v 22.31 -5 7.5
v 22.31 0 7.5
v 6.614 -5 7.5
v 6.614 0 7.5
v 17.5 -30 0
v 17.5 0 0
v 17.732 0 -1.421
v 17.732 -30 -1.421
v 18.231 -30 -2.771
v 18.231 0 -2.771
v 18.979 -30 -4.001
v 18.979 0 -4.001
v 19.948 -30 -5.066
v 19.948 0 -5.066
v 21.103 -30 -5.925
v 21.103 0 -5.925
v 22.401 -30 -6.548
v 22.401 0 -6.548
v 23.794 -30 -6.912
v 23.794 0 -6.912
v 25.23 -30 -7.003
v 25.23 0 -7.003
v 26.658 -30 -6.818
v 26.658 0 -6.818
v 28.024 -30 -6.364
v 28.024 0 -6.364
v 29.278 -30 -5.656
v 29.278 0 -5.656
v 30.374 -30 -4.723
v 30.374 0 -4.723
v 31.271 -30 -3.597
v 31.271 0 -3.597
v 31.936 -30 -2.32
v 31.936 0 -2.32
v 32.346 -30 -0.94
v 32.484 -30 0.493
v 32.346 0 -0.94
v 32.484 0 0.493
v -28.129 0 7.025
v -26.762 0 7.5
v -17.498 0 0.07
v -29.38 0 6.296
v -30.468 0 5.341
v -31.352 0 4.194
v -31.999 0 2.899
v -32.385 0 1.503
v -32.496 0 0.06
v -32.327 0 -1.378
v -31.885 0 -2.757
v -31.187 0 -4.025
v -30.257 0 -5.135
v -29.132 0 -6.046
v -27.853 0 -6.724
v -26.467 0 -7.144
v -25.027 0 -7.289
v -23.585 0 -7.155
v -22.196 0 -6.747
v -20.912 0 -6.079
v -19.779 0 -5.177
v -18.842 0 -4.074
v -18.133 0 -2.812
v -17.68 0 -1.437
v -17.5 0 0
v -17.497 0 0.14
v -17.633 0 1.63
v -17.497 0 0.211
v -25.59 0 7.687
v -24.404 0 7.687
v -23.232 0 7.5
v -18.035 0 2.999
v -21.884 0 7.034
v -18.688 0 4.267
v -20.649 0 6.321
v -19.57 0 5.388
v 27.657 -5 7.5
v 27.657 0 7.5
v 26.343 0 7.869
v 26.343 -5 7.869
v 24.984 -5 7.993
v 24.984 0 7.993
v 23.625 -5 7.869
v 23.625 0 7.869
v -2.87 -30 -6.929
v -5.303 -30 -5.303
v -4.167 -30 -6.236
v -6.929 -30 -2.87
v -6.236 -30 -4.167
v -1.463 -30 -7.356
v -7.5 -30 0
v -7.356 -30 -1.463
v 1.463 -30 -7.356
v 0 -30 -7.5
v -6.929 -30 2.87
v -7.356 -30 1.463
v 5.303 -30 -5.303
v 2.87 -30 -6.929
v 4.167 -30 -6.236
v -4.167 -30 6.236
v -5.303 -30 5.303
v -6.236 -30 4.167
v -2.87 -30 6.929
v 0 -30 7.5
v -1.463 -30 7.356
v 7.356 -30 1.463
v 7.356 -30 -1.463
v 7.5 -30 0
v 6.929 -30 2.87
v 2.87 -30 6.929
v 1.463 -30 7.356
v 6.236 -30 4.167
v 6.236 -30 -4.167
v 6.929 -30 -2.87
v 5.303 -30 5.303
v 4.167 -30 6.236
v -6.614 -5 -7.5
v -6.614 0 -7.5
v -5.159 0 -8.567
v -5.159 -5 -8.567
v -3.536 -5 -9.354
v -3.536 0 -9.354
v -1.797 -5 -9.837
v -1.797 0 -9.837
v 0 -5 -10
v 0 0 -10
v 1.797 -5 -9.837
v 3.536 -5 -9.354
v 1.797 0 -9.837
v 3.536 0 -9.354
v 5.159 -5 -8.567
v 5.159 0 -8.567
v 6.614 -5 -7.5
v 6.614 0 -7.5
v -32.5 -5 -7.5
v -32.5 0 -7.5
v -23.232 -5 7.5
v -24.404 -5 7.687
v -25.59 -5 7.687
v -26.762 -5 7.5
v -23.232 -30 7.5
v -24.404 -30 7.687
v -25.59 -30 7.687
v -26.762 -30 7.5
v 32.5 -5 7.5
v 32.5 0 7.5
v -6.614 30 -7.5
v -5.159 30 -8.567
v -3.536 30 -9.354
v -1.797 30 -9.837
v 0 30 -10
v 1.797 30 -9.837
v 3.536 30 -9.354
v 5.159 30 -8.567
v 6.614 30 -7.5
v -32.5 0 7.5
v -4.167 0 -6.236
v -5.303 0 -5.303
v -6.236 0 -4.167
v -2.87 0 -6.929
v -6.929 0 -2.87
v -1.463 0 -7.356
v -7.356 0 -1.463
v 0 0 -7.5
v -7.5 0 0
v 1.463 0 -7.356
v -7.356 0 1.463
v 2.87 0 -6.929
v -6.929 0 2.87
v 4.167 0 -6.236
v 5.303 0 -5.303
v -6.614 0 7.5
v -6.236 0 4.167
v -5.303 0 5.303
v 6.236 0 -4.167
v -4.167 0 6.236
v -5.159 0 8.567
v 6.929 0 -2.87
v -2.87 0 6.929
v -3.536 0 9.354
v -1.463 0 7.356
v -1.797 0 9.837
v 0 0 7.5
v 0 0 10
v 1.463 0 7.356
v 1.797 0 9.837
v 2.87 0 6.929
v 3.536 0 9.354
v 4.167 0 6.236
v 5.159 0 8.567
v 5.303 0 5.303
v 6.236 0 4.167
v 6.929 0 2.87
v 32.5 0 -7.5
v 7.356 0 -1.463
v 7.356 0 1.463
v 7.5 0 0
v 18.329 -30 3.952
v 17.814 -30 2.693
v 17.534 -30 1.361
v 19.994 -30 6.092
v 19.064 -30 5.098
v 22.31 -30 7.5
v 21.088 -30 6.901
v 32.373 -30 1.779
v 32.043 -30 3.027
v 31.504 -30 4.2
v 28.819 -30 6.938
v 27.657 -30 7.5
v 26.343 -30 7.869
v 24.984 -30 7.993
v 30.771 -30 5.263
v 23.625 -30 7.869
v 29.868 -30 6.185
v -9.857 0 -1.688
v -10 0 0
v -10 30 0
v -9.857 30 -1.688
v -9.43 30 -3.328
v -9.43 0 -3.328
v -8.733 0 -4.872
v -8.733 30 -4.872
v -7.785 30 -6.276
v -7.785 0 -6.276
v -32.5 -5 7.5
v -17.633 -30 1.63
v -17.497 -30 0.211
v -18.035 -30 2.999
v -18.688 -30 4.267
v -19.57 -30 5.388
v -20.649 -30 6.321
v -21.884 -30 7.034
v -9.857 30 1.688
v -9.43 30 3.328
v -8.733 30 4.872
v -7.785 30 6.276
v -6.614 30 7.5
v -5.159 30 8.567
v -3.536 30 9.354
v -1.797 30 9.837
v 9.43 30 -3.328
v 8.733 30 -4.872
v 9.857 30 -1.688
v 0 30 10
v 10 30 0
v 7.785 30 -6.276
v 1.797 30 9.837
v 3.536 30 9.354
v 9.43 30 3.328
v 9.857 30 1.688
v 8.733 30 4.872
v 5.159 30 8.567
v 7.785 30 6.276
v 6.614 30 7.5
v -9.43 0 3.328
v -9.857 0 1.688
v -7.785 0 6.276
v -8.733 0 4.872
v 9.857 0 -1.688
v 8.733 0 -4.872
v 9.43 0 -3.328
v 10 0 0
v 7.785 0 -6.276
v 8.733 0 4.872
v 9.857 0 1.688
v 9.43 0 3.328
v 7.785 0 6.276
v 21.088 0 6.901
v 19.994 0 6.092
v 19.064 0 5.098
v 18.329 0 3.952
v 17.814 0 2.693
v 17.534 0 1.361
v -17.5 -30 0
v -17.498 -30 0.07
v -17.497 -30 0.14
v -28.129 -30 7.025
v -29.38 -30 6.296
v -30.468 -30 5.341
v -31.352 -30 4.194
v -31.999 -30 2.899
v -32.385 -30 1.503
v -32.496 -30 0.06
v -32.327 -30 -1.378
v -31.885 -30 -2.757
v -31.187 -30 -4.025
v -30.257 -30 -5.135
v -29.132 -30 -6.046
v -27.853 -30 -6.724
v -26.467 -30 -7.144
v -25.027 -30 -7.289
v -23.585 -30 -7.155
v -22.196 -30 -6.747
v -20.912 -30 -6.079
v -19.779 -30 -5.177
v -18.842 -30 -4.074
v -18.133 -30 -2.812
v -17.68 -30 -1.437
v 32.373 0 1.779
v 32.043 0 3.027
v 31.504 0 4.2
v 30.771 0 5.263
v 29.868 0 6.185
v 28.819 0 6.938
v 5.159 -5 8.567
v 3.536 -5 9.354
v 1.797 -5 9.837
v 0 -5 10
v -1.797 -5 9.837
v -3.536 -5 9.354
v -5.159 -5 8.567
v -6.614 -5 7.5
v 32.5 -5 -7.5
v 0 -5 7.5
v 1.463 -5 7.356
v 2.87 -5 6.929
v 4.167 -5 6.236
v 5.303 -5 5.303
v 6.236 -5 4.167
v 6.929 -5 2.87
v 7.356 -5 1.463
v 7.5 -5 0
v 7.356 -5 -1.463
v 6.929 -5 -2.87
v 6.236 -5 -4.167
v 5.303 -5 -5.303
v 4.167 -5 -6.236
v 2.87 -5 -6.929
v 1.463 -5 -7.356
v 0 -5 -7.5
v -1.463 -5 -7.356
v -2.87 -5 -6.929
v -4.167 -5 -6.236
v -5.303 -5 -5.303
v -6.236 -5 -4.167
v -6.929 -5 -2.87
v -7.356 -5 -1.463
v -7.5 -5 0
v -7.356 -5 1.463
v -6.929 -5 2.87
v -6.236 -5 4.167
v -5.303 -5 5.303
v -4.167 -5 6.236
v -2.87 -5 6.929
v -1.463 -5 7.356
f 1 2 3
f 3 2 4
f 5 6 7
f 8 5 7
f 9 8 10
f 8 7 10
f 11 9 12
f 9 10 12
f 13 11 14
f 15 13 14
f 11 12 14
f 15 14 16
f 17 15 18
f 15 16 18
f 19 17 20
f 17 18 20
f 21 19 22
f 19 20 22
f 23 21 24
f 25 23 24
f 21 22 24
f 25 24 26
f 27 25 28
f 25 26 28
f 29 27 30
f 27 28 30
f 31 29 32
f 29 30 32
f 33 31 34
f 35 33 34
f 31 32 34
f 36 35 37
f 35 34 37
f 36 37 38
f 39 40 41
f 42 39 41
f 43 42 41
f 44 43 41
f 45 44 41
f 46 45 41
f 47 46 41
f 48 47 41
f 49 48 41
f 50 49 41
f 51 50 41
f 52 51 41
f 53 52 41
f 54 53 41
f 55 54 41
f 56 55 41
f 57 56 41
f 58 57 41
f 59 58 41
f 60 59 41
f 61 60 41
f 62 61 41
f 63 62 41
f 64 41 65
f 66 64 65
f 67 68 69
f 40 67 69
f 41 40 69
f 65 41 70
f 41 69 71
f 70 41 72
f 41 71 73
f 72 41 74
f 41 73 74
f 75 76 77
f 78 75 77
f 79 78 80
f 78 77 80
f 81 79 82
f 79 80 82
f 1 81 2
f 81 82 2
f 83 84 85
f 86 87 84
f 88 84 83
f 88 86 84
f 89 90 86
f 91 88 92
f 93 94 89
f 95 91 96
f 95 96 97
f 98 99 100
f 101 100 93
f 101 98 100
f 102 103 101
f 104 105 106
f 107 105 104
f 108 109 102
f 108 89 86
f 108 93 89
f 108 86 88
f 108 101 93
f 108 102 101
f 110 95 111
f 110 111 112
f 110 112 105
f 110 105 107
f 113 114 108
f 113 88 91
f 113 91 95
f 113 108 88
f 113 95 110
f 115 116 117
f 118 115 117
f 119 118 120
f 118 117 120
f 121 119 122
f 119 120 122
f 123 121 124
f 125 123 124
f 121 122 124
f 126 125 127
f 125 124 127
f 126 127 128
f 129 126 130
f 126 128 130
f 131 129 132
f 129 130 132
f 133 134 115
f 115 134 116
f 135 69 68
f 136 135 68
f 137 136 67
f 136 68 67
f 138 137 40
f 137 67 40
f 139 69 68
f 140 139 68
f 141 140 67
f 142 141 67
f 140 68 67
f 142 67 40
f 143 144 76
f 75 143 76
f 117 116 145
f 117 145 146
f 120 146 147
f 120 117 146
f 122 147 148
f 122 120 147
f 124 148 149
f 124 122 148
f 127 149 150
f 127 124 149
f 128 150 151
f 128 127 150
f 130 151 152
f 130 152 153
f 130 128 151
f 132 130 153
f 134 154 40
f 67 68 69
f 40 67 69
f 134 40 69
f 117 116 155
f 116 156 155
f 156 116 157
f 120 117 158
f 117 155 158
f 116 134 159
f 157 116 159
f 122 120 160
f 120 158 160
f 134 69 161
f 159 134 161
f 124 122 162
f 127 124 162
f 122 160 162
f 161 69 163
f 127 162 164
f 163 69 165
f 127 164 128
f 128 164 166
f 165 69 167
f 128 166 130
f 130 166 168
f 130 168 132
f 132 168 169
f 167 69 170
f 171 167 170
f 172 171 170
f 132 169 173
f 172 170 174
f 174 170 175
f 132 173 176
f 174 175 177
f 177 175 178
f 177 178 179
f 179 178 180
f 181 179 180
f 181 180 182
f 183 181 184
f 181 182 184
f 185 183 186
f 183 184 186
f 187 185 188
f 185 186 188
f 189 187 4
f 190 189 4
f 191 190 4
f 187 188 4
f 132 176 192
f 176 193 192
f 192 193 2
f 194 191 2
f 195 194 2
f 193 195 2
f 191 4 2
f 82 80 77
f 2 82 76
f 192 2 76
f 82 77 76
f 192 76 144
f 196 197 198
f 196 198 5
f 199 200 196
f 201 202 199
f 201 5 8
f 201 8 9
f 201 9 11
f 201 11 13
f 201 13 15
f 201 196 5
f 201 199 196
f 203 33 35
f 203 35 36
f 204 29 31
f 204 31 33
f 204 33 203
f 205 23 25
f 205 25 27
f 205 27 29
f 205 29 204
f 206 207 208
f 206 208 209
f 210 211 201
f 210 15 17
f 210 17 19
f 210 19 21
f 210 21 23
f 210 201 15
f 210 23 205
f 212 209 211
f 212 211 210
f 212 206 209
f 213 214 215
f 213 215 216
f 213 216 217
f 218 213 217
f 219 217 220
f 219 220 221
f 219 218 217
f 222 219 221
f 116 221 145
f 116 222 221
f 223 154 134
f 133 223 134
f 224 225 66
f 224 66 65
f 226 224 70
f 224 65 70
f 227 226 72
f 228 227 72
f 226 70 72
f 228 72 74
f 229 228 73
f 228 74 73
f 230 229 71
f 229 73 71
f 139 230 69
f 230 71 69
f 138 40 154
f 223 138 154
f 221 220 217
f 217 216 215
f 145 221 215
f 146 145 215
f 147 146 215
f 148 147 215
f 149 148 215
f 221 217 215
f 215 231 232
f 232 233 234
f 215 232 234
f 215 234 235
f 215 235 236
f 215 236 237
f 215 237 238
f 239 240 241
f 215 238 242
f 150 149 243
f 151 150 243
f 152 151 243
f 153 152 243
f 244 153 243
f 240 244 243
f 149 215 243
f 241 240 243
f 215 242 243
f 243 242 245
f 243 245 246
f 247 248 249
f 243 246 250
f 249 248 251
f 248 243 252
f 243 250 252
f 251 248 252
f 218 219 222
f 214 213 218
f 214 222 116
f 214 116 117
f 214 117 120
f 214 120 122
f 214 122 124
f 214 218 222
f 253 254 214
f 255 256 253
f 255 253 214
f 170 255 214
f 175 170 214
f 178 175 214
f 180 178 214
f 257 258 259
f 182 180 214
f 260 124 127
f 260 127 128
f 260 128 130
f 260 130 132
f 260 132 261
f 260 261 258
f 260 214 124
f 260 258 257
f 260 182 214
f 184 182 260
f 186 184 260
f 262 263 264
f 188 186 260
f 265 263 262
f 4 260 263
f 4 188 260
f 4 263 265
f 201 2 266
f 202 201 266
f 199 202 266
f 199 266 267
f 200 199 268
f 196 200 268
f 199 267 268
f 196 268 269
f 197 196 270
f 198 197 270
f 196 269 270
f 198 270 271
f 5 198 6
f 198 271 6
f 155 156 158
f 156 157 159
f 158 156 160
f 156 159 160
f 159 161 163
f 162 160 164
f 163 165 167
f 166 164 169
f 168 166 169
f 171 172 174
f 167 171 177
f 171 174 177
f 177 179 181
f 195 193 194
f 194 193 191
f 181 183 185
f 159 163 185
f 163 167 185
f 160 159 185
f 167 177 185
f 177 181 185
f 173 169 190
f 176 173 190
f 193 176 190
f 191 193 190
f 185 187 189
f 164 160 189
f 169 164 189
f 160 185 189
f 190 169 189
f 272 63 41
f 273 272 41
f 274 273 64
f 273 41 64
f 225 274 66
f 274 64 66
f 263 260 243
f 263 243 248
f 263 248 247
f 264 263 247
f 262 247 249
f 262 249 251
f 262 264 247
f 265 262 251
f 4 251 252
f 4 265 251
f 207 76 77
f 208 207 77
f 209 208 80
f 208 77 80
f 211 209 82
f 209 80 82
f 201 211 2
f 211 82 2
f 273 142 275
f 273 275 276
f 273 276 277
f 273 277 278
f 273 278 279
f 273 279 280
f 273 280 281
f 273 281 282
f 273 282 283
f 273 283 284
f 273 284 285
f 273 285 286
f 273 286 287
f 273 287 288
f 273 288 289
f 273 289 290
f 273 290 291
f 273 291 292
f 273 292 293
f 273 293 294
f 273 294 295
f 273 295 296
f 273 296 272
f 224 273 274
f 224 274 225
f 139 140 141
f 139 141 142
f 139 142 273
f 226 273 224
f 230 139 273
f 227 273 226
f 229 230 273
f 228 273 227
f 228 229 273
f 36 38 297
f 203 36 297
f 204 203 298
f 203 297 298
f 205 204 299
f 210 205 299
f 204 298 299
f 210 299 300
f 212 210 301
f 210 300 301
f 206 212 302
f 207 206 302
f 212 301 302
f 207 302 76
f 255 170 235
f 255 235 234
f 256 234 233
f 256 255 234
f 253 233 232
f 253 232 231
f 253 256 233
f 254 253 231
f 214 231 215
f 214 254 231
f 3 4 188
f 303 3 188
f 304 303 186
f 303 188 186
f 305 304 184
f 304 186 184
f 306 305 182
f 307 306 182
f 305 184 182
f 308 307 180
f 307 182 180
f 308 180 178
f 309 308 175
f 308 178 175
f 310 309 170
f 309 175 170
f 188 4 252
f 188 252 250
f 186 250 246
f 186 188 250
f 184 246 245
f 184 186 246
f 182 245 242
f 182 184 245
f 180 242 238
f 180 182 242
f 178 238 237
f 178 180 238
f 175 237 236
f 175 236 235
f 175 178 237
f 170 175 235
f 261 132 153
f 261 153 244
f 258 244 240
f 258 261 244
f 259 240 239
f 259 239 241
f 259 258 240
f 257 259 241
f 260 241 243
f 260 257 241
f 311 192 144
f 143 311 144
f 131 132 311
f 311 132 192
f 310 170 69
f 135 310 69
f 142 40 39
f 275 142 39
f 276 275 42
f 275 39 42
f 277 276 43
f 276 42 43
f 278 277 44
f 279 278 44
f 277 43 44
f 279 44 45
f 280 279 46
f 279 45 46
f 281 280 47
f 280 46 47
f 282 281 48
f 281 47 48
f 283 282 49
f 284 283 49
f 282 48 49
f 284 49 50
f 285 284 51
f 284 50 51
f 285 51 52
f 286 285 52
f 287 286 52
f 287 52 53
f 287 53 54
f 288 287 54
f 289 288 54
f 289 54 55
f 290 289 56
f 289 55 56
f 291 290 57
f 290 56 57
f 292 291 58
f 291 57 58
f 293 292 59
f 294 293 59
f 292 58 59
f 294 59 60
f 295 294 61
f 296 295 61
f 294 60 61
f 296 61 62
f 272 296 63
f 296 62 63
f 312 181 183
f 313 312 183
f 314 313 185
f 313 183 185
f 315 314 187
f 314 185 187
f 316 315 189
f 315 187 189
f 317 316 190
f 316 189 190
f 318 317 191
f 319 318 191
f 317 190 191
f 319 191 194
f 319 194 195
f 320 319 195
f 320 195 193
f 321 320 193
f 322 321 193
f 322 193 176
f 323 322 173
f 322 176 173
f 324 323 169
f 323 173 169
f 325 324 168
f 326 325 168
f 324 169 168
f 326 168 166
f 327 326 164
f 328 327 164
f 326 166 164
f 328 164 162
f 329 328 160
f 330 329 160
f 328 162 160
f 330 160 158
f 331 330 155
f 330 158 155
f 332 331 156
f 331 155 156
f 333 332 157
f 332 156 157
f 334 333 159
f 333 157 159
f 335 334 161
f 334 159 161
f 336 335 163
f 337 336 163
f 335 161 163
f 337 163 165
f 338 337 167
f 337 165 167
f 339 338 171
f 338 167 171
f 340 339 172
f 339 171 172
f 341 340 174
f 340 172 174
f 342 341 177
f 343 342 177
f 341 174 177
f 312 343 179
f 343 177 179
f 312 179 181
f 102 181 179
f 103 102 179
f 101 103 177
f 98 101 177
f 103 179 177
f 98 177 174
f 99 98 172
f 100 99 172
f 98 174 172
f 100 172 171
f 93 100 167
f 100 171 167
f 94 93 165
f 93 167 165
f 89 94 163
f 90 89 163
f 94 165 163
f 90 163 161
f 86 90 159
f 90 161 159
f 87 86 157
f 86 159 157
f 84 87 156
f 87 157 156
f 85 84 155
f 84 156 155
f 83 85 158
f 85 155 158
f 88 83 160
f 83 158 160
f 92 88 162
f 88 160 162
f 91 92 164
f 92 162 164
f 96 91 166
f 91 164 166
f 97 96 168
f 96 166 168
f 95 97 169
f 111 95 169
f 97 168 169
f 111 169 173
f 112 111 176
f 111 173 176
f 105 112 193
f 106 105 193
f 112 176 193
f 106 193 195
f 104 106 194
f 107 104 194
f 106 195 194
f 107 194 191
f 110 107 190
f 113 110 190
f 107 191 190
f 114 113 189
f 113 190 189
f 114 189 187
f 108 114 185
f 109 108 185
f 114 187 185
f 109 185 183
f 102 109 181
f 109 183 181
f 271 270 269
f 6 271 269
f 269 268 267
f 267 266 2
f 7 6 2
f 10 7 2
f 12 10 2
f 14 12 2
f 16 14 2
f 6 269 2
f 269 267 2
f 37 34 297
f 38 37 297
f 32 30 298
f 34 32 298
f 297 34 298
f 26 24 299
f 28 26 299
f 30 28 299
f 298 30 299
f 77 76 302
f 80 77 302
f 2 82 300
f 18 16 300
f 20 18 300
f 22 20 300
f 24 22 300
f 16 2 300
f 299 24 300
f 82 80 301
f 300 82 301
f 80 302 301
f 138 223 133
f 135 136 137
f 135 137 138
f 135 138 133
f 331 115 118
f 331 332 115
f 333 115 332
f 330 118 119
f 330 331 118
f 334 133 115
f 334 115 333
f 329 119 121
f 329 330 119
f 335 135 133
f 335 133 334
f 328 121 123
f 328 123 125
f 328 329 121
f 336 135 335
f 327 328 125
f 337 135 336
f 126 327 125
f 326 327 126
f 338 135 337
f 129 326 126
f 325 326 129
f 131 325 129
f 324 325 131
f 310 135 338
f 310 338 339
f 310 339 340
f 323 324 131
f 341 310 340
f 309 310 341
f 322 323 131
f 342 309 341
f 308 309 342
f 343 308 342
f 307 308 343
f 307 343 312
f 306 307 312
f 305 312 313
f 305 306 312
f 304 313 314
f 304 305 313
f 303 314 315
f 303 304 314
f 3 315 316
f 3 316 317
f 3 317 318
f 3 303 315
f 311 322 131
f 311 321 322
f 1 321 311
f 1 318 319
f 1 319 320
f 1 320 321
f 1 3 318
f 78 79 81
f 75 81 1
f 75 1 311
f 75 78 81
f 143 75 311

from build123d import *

# Parameters (mm, degrees)
F1_DEPTH = 5
F2_DEPTH = 30
F3_DEPTH = 30


with BuildPart() as f1:
    # F0 (on Front) → F1 (new body)
    with BuildSketch(Plane.XZ):
        with BuildLine():
            Line((-26.7617844339, 7.5), (-32.5, 7.5))
            Line((-32.5, 7.5), (-32.5, -7.5))
            Line((-32.5, -7.5), (-6.6143782777, -7.5))
            ThreePointArc((-6.6143782777, -7.5), (-9.1143782777, -4.1143782777), (-10, 0))
            Line((-10, 0), (-17.5, 0))
            ThreePointArc((-17.5, 0), (-29.7169290115, -5.6180316665), (-26.7617844339, 7.5))
        make_face()
        with BuildLine():
            ThreePointArc((-23.2323020473, 7.5), (-24.9970432406, 7.7105769419), (-26.7617844339, 7.5))
            Line((-26.7617844339, 7.5), (-23.2323020473, 7.5))
        make_face()
        with BuildLine():
            Line((-23.2323020473, 7.5), (-26.7617844339, 7.5))
            ThreePointArc((-26.7617844339, 7.5), (-29.7169290115, -5.6180316665), (-17.5, 0))
            ThreePointArc((-17.5, 0), (-17.4977824669, 0.1052780923), (-17.4970432406, 0.2105769419))
            ThreePointArc((-17.4970432406, 0.2105769419), (-19.1027426481, 4.8481647335), (-23.2323020473, 7.5))
        make_face()
        with BuildLine():
            Line((-6.6143782777, 7.5), (-23.2323020473, 7.5))
            ThreePointArc((-23.2323020473, 7.5), (-19.1027426481, 4.8481647335), (-17.4970432406, 0.2105769419))
            ThreePointArc((-17.4970432406, 0.2105769419), (-17.4977824669, 0.1052780923), (-17.5, 0))
            Line((-17.5, 0), (-10, 0))
            ThreePointArc((-10, 0), (-9.1143782777, 4.1143782777), (-6.6143782777, 7.5))
        make_face()
        with BuildLine():
            ThreePointArc((-10, 0), (-9.1143782777, -4.1143782777), (-6.6143782777, -7.5))
            Line((-6.6143782777, -7.5), (2.3e-08, -7.5))
            ThreePointArc((2.3e-08, -7.5), (-5.3033008508, -5.303300867), (-7.5, 0))
            Line((-7.5, 0), (-10, 0))
        make_face()
        with BuildLine():
            Line((2.3e-08, -7.5), (-6.6143782777, -7.5))
            ThreePointArc((-6.6143782777, -7.5), (0, -10), (6.6143782777, -7.5))
            Line((6.6143782777, -7.5), (2.3e-08, -7.5))
        make_face()
        with BuildLine():
            ThreePointArc((6.6143782777, 7.5), (0, 10), (-6.6143782777, 7.5))
            Line((-6.6143782777, 7.5), (2.31e-08, 7.5))
            Line((2.31e-08, 7.5), (6.6143782777, 7.5))
        make_face()
        with BuildLine():
            Line((2.31e-08, 7.5), (-6.6143782777, 7.5))
            ThreePointArc((-6.6143782777, 7.5), (-9.1143782777, 4.1143782777), (-10, 0))
            Line((-10, 0), (-7.5, 0))
            ThreePointArc((-7.5, 0), (-5.3033008507, 5.3033008671), (2.31e-08, 7.5))
        make_face()
        with BuildLine():
            ThreePointArc((7.5, 0), (5.303300867, -5.3033008508), (2.3e-08, -7.5))
            Line((2.3e-08, -7.5), (6.6143782777, -7.5))
            ThreePointArc((6.6143782777, -7.5), (9.1143782777, -4.1143782777), (10, 0))
            Line((10, 0), (7.5, 0))
        make_face()
        with BuildLine():
            ThreePointArc((10, 0), (9.1143782777, -4.1143782777), (6.6143782777, -7.5))
            Line((6.6143782777, -7.5), (32.5, -7.5))
            Line((32.5, -7.5), (32.5, 7.5))
            Line((32.5, 7.5), (27.6573566535, 7.5))
            ThreePointArc((27.6573566535, 7.5), (31.1604351362, 4.7470222531), (32.4837981584, 0.4927120101))
            ThreePointArc((32.4837981584, 0.4927120101), (25.2302873187, -7.0032364351), (17.5, 0))
            Line((17.5, 0), (10, 0))
        make_face()
        with BuildLine():
            Line((6.6143782777, 7.5), (2.31e-08, 7.5))
            ThreePointArc((2.31e-08, 7.5), (5.3033008671, 5.3033008507), (7.5, 0))
            Line((7.5, 0), (10, 0))
            ThreePointArc((10, 0), (9.1143782777, 4.1143782777), (6.6143782777, 7.5))
        make_face()
        with BuildLine():
            Line((22.3102396633, 7.5), (6.6143782777, 7.5))
            ThreePointArc((6.6143782777, 7.5), (9.1143782777, 4.1143782777), (10, 0))
            Line((10, 0), (17.5, 0))
            ThreePointArc((17.5, 0), (18.6706789969, 4.541727502), (22.3102396633, 7.5))
        make_face()
        with BuildLine():
            ThreePointArc((27.6573566535, 7.5), (24.9837981584, 7.9927120101), (22.3102396633, 7.5))
            Line((22.3102396633, 7.5), (27.6573566535, 7.5))
        make_face()
        with BuildLine():
            Line((27.6573566535, 7.5), (22.3102396633, 7.5))
            ThreePointArc((22.3102396633, 7.5), (18.6706789969, 4.541727502), (17.5, 0))
            ThreePointArc((17.5, 0), (25.2302873187, -7.0032364351), (32.4837981584, 0.4927120101))
            ThreePointArc((32.4837981584, 0.4927120101), (31.1604351362, 4.7470222531), (27.6573566535, 7.5))
        make_face()
    extrude(amount=F1_DEPTH)


with BuildPart() as f2:
    # F0 (on Front) → F2 (new body)
    with BuildSketch(Plane.XZ):
        with BuildLine():
            ThreePointArc((-23.2323020473, 7.5), (-24.9970432406, 7.7105769419), (-26.7617844339, 7.5))
            Line((-26.7617844339, 7.5), (-23.2323020473, 7.5))
        make_face()
        with BuildLine():
            Line((-23.2323020473, 7.5), (-26.7617844339, 7.5))
            ThreePointArc((-26.7617844339, 7.5), (-29.7169290115, -5.6180316665), (-17.5, 0))
            ThreePointArc((-17.5, 0), (-17.4977824669, 0.1052780923), (-17.4970432406, 0.2105769419))
            ThreePointArc((-17.4970432406, 0.2105769419), (-19.1027426481, 4.8481647335), (-23.2323020473, 7.5))
        make_face()
    extrude(amount=F2_DEPTH)


with BuildPart() as f2b:
    # F0 (on Front) → F2, piece 2 (new body)
    with BuildSketch(Plane.XZ):
        with BuildLine():
            ThreePointArc((27.6573566535, 7.5), (24.9837981584, 7.9927120101), (22.3102396633, 7.5))
            Line((22.3102396633, 7.5), (27.6573566535, 7.5))
        make_face()
        with BuildLine():
            Line((27.6573566535, 7.5), (22.3102396633, 7.5))
            ThreePointArc((22.3102396633, 7.5), (18.6706789969, 4.541727502), (17.5, 0))
            ThreePointArc((17.5, 0), (25.2302873187, -7.0032364351), (32.4837981584, 0.4927120101))
            ThreePointArc((32.4837981584, 0.4927120101), (31.1604351362, 4.7470222531), (27.6573566535, 7.5))
        make_face()
    extrude(amount=F2_DEPTH)


with BuildPart() as f2c:
    # F0 (on Front) → F2, piece 3 (new body)
    with BuildSketch(Plane.XZ):
        with BuildLine():
            ThreePointArc((-7.5, 0), (-5.3033008508, -5.303300867), (2.3e-08, -7.5))
            ThreePointArc((2.3e-08, -7.5), (5.303300867, -5.3033008508), (7.5, 0))
            ThreePointArc((7.5, 0), (5.3033008671, 5.3033008507), (2.31e-08, 7.5))
            ThreePointArc((2.31e-08, 7.5), (-5.3033008507, 5.3033008671), (-7.5, 0))
        make_face()
    extrude(amount=F2_DEPTH)


with BuildPart() as f3:
    # F0 (on Front) → F3 (new body)
    with BuildSketch(Plane.XZ):
        with BuildLine():
            Line((6.6143782777, 7.5), (2.31e-08, 7.5))
            ThreePointArc((2.31e-08, 7.5), (5.3033008671, 5.3033008507), (7.5, 0))
            Line((7.5, 0), (10, 0))
            ThreePointArc((10, 0), (9.1143782777, 4.1143782777), (6.6143782777, 7.5))
        make_face()
        with BuildLine():
            ThreePointArc((-7.5, 0), (-5.3033008508, -5.303300867), (2.3e-08, -7.5))
            ThreePointArc((2.3e-08, -7.5), (5.303300867, -5.3033008508), (7.5, 0))
            ThreePointArc((7.5, 0), (5.3033008671, 5.3033008507), (2.31e-08, 7.5))
            ThreePointArc((2.31e-08, 7.5), (-5.3033008507, 5.3033008671), (-7.5, 0))
        make_face()
        with BuildLine():
            ThreePointArc((6.6143782777, 7.5), (0, 10), (-6.6143782777, 7.5))
            Line((-6.6143782777, 7.5), (2.31e-08, 7.5))
            Line((2.31e-08, 7.5), (6.6143782777, 7.5))
        make_face()
        with BuildLine():
            Line((2.31e-08, 7.5), (-6.6143782777, 7.5))
            ThreePointArc((-6.6143782777, 7.5), (-9.1143782777, 4.1143782777), (-10, 0))
            Line((-10, 0), (-7.5, 0))
            ThreePointArc((-7.5, 0), (-5.3033008507, 5.3033008671), (2.31e-08, 7.5))
        make_face()
        with BuildLine():
            ThreePointArc((-10, 0), (-9.1143782777, -4.1143782777), (-6.6143782777, -7.5))
            Line((-6.6143782777, -7.5), (2.3e-08, -7.5))
            ThreePointArc((2.3e-08, -7.5), (-5.3033008508, -5.303300867), (-7.5, 0))
            Line((-7.5, 0), (-10, 0))
        make_face()
        with BuildLine():
            Line((2.3e-08, -7.5), (-6.6143782777, -7.5))
            ThreePointArc((-6.6143782777, -7.5), (0, -10), (6.6143782777, -7.5))
            Line((6.6143782777, -7.5), (2.3e-08, -7.5))
        make_face()
        with BuildLine():
            ThreePointArc((7.5, 0), (5.303300867, -5.3033008508), (2.3e-08, -7.5))
            Line((2.3e-08, -7.5), (6.6143782777, -7.5))
            ThreePointArc((6.6143782777, -7.5), (9.1143782777, -4.1143782777), (10, 0))
            Line((10, 0), (7.5, 0))
        make_face()
    extrude(amount=-F3_DEPTH)


solid = Compound([f1.part, f2.part, f2b.part, f2c.part, f3.part])
